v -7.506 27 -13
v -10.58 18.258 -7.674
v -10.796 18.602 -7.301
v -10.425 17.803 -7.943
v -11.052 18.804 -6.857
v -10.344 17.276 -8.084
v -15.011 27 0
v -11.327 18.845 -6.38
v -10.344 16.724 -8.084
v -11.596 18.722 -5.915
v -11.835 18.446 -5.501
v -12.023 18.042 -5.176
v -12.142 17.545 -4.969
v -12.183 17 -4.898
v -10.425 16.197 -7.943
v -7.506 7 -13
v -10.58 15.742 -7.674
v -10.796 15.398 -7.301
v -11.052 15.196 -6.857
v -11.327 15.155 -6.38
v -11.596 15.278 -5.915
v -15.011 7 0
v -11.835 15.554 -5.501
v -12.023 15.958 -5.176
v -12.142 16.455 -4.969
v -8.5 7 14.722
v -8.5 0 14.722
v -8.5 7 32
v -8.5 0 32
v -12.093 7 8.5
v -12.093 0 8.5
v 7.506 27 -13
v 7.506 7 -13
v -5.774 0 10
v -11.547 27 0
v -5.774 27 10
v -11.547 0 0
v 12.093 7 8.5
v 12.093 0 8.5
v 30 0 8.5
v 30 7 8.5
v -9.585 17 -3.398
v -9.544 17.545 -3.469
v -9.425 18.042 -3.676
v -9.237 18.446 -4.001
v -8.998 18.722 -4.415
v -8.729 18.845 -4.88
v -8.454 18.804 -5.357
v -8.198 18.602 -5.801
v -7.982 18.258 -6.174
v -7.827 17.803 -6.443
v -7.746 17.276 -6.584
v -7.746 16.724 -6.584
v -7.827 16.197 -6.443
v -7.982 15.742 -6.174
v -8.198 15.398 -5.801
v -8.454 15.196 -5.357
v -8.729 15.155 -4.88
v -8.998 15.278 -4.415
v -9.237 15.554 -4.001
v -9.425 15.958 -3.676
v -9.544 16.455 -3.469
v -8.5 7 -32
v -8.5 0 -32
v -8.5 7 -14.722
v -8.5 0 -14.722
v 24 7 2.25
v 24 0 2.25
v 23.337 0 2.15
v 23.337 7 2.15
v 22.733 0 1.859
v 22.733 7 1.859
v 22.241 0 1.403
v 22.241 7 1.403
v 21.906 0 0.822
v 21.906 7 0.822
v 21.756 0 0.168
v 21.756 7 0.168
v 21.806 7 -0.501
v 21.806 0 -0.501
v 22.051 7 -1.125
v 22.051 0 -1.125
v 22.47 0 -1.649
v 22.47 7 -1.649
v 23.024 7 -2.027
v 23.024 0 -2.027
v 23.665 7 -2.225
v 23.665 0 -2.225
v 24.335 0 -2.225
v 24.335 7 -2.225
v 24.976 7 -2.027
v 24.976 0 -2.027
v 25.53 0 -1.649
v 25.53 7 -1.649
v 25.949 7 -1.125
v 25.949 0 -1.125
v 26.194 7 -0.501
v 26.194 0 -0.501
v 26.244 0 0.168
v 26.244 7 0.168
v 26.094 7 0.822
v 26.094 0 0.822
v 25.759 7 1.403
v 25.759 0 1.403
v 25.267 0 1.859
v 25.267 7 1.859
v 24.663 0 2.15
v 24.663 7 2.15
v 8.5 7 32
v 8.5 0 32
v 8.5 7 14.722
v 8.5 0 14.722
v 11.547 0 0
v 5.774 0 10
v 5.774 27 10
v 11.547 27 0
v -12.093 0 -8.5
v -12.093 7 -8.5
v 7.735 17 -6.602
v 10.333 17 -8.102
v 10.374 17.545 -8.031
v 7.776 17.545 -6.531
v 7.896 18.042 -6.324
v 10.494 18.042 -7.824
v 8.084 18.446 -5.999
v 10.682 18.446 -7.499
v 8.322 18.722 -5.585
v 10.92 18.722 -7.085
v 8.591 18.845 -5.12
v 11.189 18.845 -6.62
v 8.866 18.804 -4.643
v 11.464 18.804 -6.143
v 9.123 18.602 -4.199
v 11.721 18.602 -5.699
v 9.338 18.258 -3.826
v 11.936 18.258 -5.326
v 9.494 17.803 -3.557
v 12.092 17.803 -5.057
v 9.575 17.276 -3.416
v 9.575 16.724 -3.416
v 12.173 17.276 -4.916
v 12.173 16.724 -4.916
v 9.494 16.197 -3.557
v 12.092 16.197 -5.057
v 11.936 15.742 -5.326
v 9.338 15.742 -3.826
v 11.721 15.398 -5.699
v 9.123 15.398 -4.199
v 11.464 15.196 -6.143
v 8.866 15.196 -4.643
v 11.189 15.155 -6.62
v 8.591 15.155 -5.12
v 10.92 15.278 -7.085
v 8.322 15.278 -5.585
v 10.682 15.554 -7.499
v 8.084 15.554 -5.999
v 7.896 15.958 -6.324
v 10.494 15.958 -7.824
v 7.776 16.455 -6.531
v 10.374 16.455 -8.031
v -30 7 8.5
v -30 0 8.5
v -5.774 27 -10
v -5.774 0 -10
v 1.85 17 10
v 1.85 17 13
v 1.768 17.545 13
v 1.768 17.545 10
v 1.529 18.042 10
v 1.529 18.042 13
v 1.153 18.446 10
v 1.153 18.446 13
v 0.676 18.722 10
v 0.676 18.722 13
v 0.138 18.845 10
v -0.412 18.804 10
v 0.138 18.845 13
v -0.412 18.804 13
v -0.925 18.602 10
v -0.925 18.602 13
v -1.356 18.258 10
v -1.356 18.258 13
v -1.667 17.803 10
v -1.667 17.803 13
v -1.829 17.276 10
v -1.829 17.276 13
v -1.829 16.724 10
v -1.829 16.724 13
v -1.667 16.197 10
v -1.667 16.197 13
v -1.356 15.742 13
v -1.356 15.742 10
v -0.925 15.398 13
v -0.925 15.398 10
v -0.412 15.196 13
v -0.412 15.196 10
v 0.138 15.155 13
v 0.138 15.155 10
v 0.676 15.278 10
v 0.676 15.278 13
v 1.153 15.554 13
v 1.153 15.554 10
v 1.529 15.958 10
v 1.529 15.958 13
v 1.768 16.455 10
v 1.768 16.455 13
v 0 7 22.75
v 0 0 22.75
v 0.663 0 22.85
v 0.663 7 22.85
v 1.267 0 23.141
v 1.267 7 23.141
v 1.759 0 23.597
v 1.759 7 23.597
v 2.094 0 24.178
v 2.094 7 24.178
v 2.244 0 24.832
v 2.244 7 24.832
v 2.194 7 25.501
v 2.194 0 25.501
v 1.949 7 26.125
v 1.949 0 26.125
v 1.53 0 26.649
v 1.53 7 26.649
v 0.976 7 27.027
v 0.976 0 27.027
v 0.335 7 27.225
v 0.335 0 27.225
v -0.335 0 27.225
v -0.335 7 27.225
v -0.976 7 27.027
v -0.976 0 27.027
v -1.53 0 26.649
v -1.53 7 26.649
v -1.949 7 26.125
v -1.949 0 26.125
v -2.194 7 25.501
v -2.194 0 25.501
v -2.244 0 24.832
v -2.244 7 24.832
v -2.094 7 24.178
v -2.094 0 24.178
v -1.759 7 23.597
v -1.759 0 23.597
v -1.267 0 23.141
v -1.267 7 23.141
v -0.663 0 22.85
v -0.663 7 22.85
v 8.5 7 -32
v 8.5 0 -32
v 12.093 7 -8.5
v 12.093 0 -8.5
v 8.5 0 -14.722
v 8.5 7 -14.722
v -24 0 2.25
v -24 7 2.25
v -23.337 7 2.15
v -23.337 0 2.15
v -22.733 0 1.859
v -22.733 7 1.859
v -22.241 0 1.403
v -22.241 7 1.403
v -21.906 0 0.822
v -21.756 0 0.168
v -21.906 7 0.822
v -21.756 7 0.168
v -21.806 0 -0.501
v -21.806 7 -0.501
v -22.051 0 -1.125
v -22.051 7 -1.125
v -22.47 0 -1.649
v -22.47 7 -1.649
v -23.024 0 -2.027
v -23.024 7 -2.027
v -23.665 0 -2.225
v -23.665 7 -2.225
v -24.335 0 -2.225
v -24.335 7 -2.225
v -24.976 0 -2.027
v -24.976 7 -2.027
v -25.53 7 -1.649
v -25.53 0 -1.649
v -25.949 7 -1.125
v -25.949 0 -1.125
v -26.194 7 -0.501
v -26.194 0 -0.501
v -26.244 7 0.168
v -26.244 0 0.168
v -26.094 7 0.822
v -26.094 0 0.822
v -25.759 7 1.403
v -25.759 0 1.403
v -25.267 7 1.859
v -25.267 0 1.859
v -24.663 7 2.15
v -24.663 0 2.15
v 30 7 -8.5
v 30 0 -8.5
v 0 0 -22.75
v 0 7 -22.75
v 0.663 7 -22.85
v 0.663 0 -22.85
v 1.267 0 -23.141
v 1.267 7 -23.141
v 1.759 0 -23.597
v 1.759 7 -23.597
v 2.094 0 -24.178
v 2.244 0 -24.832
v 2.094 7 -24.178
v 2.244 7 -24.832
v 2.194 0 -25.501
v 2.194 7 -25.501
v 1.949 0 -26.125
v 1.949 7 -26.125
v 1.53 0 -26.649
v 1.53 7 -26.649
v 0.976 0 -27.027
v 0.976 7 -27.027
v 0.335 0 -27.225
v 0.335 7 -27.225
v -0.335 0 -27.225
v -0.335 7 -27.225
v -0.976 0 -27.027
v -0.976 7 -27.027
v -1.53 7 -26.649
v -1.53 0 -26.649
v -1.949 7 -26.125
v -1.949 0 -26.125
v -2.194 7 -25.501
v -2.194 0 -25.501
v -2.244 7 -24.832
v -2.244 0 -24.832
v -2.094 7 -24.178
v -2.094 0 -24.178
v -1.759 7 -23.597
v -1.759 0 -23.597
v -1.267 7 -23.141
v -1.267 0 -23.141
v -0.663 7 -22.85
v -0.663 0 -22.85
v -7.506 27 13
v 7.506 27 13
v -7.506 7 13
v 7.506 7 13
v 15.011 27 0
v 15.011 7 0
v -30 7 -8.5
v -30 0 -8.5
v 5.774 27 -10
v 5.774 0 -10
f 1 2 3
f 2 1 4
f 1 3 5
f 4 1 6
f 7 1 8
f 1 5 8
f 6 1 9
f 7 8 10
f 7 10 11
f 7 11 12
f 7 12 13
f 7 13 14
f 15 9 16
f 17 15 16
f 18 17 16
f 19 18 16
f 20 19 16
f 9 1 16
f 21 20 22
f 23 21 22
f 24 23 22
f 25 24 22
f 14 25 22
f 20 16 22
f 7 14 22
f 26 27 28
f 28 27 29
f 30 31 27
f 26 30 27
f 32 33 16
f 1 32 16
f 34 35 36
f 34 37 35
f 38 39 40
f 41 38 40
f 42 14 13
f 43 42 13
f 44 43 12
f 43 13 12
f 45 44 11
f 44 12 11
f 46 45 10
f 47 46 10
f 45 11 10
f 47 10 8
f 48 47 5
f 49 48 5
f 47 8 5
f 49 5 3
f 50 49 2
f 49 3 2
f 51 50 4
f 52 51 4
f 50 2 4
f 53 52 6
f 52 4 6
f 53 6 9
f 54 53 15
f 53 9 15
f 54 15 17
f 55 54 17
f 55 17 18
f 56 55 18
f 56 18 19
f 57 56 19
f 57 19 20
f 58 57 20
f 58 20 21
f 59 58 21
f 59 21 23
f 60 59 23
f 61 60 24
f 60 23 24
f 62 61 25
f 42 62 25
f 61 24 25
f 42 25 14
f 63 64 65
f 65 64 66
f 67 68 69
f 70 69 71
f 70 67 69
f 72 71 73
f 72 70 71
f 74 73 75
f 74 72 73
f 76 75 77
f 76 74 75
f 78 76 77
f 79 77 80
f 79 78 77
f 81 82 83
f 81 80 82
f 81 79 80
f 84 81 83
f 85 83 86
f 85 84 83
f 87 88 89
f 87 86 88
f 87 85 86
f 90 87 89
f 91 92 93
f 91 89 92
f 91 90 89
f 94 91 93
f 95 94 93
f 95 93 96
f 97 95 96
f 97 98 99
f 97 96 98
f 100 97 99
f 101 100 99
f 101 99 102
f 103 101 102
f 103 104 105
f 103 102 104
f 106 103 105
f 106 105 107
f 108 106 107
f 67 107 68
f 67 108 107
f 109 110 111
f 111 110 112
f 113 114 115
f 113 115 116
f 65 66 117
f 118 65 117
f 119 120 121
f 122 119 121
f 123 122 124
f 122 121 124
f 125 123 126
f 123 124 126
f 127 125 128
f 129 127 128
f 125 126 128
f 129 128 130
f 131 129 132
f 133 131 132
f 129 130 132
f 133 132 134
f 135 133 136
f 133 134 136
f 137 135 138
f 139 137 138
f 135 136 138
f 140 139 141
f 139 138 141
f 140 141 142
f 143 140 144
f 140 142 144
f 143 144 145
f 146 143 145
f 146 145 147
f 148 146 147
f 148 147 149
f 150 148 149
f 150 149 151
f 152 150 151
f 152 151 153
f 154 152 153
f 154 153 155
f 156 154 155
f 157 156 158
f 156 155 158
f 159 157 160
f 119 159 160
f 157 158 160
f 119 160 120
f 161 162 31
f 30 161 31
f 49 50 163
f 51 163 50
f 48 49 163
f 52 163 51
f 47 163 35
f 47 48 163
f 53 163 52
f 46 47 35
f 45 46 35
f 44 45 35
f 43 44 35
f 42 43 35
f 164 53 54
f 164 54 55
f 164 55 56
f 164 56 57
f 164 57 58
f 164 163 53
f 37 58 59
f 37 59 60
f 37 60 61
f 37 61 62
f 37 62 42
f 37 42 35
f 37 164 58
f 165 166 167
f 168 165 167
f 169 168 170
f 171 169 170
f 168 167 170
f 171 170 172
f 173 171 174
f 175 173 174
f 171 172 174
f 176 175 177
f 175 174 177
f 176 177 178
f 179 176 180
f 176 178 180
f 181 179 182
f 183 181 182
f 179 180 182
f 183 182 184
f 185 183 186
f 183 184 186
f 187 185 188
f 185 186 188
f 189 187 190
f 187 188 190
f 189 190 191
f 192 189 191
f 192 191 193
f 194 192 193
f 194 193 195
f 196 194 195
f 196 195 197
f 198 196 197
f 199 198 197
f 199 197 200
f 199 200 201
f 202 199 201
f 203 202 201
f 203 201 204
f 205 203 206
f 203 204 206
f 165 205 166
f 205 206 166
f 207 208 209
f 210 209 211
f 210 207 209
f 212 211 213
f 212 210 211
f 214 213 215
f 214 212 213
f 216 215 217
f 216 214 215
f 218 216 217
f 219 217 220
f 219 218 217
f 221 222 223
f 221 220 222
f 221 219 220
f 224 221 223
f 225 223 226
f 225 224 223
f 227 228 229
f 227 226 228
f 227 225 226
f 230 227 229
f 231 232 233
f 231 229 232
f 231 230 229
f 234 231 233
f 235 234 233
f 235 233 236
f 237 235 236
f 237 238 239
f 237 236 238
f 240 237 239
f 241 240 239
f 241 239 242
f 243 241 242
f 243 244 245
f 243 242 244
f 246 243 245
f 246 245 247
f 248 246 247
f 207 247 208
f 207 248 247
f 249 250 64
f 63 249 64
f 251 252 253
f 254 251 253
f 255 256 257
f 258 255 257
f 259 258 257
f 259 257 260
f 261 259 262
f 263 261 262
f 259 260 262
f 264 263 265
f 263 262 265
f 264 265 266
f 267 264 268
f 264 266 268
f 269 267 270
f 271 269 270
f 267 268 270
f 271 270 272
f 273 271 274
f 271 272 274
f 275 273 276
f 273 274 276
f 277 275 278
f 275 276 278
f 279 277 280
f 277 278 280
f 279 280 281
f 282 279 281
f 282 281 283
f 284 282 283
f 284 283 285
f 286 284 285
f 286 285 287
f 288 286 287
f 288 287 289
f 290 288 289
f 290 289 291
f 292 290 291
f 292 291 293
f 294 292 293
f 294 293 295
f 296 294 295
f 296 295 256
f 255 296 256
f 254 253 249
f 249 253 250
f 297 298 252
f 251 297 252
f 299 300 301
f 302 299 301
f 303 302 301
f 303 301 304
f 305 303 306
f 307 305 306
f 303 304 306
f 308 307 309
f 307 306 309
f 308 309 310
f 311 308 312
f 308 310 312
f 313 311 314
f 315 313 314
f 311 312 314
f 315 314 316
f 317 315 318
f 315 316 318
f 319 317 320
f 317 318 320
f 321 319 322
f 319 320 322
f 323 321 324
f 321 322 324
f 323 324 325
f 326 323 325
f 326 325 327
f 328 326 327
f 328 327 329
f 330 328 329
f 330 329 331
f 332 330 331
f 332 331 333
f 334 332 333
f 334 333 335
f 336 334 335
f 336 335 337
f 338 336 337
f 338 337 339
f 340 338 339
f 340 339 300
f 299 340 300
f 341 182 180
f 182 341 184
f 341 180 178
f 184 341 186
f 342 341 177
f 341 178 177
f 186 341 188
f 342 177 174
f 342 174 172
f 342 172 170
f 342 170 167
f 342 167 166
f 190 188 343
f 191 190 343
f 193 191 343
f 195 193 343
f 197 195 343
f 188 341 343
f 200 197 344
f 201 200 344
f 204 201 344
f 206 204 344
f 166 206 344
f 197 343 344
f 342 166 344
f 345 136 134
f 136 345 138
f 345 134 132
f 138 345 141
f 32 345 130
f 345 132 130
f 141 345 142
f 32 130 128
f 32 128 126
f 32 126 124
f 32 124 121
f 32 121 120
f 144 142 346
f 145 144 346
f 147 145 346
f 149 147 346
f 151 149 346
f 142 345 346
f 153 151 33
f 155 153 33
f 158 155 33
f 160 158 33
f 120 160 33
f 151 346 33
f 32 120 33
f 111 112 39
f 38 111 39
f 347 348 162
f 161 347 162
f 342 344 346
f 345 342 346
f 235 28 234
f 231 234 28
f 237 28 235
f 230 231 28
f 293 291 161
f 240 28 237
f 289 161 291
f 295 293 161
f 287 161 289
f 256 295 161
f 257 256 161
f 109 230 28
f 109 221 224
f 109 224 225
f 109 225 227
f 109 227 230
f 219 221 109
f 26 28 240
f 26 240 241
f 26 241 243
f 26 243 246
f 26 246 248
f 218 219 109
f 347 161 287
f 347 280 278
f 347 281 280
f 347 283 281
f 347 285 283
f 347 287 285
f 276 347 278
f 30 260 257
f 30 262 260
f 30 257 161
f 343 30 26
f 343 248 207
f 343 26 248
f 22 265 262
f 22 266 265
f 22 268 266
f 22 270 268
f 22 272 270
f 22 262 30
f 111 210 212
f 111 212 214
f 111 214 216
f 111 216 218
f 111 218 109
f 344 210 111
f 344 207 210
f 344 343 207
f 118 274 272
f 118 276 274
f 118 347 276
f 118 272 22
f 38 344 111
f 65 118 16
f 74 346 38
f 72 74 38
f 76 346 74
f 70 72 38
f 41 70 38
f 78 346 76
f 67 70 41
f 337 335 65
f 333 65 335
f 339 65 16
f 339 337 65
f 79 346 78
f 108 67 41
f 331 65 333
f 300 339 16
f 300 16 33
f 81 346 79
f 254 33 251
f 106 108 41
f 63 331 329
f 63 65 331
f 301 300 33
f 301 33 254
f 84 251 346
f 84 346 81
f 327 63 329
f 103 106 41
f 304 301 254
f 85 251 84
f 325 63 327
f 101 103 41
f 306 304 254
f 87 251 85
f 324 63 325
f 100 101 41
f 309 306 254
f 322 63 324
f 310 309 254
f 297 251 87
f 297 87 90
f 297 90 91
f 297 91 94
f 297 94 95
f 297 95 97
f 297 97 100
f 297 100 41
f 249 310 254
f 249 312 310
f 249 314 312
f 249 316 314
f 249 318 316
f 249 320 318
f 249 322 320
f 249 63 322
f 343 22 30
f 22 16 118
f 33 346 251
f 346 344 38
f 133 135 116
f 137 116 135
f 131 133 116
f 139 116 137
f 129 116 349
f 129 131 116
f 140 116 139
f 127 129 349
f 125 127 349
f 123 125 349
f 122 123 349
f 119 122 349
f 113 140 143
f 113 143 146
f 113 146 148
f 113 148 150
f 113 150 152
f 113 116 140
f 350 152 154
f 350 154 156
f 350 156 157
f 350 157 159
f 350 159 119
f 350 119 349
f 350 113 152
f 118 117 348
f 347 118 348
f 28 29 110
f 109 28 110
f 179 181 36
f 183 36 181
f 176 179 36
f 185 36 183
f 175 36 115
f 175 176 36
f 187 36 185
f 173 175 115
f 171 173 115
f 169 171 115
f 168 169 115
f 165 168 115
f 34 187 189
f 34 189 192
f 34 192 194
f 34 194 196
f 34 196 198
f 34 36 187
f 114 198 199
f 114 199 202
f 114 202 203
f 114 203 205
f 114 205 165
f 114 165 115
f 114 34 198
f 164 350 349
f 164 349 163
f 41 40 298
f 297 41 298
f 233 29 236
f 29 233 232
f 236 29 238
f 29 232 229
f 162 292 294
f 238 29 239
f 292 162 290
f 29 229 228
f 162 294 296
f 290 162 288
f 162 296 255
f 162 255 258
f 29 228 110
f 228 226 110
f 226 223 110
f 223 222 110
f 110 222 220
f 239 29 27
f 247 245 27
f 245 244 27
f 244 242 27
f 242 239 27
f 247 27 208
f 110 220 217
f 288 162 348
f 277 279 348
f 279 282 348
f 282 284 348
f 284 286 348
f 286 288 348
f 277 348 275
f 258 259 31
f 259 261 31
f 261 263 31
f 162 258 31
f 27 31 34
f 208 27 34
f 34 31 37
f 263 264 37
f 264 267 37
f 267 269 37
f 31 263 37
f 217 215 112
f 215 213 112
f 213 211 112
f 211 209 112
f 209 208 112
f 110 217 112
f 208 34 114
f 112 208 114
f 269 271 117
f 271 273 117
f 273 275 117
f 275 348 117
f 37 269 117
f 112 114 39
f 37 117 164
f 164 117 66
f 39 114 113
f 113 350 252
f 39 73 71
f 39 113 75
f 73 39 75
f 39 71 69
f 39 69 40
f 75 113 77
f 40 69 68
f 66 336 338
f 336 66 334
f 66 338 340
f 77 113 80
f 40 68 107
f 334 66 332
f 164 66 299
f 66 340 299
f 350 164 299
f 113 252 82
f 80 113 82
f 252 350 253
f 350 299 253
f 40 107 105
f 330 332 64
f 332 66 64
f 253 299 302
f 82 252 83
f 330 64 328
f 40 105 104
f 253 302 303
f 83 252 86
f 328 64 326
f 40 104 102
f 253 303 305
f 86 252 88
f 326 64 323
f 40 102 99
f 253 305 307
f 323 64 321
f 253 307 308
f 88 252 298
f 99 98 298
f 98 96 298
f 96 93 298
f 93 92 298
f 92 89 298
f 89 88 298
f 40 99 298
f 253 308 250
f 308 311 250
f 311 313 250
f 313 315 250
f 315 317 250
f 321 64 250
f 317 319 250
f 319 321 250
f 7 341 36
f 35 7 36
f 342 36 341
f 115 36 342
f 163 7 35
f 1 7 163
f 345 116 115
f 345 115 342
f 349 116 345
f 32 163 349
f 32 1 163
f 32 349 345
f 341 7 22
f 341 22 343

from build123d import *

# Parameters (mm, degrees)
BOSS_EXTRUDE1_DEPTH = 7
BOSS_EXTRUDE2_DEPTH = 20
SKETCH3_R           = 2.25
CUT_EXTRUDE1_DEPTH  = 8
SKETCH4_R           = 2.25
CUT_EXTRUDE2_DEPTH  = 8
SKETCH5_R           = 1.85
CUT_EXTRUDE4_DEPTH  = 3
SKETCH6_R           = 1.85
CUT_EXTRUDE5_DEPTH  = 3
SKETCH7_R           = 1.85
CUT_EXTRUDE6_DEPTH  = 3


with BuildPart() as part:
    # Sketch1 → Boss-Extrude1 (new body)
    with BuildSketch(Plane(origin=(0, 0, 0), x_dir=(1, 0, 0), z_dir=(0, 1, 0))):
        Polygon((12.092522712, -8.5), (30, -8.5), (30, 8.5), (12.092522712, 8.5), (8.5, 14.722431864), (8.5, 32), (-8.5, 32), (-8.5, 14.722431864), (-12.092522712, 8.5), (-30, 8.5), (-30, -8.5), (-12.092522712, -8.5), (-8.5, -14.722431864), (-8.5, -32), (8.5, -32), (8.5, -14.722431864), align=None)
        Polygon((-11.547005384, 0), (-5.773502692, 10), (5.773502692, 10), (11.547005384, 0), (5.773502692, -10), (-5.773502692, -10), align=None, mode=Mode.SUBTRACT)
    extrude(amount=BOSS_EXTRUDE1_DEPTH)

    # Sketch2 → Boss-Extrude2 (add)
    with BuildSketch(Plane(origin=(0, 7, 0), x_dir=(1, 0, 0), z_dir=(0, 1, 0))):
        Polygon((-15.011106999, 0), (-7.505553499, -13), (7.505553499, -13), (15.011106999, 0), (7.505553499, 13), (-7.505553499, 13), align=None)
        Polygon((-11.547005384, 0), (-5.773502692, -10), (5.773502692, -10), (11.547005384, 0), (5.773502692, 10), (-5.773502692, 10), align=None, mode=Mode.SUBTRACT)
    extrude(amount=BOSS_EXTRUDE2_DEPTH)

    # Sketch3 → Cut-Extrude1 (cut, through all)
    with BuildSketch(Plane(origin=(0, 7, 0), x_dir=(1, 0, 0), z_dir=(0, 1, 0))):
        with Locations(Location((0, 25, 0), (0, 0, 270))):  # turned: the seam where the file's is
            Circle(SKETCH3_R)
    cut_extrude1 = extrude(amount=-CUT_EXTRUDE1_DEPTH, mode=Mode.SUBTRACT)

    # Mirror1: Cut-Extrude1 across plane
    add(cut_extrude1.mirror(Plane.XY), mode=Mode.SUBTRACT)

    # Sketch4 → Cut-Extrude2 (cut, through all)
    with BuildSketch(Plane(origin=(0, 7, 0), x_dir=(1, 0, 0), z_dir=(0, 1, 0))):
        with Locations(Location((-24, 0, 0), (0, 0, 270))):  # turned: the seam where the file's is
            Circle(SKETCH4_R)
    cut_extrude2 = extrude(amount=-CUT_EXTRUDE2_DEPTH, mode=Mode.SUBTRACT)

    # Mirror2: Cut-Extrude2 across plane
    add(cut_extrude2.mirror(Plane(origin=(0, 0, 0), x_dir=(0, 0, 1), z_dir=(1, 0, 0))), mode=Mode.SUBTRACT)

    # Sketch5 → Cut-Extrude4 (cut)
    with BuildSketch(Plane.XY.offset(13)):
        with Locations((0, 17)):
            Circle(SKETCH5_R)
    extrude(amount=-CUT_EXTRUDE4_DEPTH, mode=Mode.SUBTRACT)

    # Sketch6 → Cut-Extrude5 (cut)
    with BuildSketch(Plane(origin=(11.258330249, 0, -6.5), x_dir=(-0.5, 0, -0.866025404), z_dir=(0.866025404, 0, -0.5))):
        with Locations((0, 17)):
            Circle(SKETCH6_R)
    extrude(amount=-CUT_EXTRUDE5_DEPTH, mode=Mode.SUBTRACT)

    # Sketch7 → Cut-Extrude6 (cut)
    with BuildSketch(Plane(origin=(-11.258330249, 0, -6.5), x_dir=(-0.5, 0, 0.866025404), z_dir=(-0.866025404, 0, -0.5))):
        with Locations((0, 17)):
            Circle(SKETCH7_R)
    extrude(amount=-CUT_EXTRUDE6_DEPTH, mode=Mode.SUBTRACT)


solid = part.part
